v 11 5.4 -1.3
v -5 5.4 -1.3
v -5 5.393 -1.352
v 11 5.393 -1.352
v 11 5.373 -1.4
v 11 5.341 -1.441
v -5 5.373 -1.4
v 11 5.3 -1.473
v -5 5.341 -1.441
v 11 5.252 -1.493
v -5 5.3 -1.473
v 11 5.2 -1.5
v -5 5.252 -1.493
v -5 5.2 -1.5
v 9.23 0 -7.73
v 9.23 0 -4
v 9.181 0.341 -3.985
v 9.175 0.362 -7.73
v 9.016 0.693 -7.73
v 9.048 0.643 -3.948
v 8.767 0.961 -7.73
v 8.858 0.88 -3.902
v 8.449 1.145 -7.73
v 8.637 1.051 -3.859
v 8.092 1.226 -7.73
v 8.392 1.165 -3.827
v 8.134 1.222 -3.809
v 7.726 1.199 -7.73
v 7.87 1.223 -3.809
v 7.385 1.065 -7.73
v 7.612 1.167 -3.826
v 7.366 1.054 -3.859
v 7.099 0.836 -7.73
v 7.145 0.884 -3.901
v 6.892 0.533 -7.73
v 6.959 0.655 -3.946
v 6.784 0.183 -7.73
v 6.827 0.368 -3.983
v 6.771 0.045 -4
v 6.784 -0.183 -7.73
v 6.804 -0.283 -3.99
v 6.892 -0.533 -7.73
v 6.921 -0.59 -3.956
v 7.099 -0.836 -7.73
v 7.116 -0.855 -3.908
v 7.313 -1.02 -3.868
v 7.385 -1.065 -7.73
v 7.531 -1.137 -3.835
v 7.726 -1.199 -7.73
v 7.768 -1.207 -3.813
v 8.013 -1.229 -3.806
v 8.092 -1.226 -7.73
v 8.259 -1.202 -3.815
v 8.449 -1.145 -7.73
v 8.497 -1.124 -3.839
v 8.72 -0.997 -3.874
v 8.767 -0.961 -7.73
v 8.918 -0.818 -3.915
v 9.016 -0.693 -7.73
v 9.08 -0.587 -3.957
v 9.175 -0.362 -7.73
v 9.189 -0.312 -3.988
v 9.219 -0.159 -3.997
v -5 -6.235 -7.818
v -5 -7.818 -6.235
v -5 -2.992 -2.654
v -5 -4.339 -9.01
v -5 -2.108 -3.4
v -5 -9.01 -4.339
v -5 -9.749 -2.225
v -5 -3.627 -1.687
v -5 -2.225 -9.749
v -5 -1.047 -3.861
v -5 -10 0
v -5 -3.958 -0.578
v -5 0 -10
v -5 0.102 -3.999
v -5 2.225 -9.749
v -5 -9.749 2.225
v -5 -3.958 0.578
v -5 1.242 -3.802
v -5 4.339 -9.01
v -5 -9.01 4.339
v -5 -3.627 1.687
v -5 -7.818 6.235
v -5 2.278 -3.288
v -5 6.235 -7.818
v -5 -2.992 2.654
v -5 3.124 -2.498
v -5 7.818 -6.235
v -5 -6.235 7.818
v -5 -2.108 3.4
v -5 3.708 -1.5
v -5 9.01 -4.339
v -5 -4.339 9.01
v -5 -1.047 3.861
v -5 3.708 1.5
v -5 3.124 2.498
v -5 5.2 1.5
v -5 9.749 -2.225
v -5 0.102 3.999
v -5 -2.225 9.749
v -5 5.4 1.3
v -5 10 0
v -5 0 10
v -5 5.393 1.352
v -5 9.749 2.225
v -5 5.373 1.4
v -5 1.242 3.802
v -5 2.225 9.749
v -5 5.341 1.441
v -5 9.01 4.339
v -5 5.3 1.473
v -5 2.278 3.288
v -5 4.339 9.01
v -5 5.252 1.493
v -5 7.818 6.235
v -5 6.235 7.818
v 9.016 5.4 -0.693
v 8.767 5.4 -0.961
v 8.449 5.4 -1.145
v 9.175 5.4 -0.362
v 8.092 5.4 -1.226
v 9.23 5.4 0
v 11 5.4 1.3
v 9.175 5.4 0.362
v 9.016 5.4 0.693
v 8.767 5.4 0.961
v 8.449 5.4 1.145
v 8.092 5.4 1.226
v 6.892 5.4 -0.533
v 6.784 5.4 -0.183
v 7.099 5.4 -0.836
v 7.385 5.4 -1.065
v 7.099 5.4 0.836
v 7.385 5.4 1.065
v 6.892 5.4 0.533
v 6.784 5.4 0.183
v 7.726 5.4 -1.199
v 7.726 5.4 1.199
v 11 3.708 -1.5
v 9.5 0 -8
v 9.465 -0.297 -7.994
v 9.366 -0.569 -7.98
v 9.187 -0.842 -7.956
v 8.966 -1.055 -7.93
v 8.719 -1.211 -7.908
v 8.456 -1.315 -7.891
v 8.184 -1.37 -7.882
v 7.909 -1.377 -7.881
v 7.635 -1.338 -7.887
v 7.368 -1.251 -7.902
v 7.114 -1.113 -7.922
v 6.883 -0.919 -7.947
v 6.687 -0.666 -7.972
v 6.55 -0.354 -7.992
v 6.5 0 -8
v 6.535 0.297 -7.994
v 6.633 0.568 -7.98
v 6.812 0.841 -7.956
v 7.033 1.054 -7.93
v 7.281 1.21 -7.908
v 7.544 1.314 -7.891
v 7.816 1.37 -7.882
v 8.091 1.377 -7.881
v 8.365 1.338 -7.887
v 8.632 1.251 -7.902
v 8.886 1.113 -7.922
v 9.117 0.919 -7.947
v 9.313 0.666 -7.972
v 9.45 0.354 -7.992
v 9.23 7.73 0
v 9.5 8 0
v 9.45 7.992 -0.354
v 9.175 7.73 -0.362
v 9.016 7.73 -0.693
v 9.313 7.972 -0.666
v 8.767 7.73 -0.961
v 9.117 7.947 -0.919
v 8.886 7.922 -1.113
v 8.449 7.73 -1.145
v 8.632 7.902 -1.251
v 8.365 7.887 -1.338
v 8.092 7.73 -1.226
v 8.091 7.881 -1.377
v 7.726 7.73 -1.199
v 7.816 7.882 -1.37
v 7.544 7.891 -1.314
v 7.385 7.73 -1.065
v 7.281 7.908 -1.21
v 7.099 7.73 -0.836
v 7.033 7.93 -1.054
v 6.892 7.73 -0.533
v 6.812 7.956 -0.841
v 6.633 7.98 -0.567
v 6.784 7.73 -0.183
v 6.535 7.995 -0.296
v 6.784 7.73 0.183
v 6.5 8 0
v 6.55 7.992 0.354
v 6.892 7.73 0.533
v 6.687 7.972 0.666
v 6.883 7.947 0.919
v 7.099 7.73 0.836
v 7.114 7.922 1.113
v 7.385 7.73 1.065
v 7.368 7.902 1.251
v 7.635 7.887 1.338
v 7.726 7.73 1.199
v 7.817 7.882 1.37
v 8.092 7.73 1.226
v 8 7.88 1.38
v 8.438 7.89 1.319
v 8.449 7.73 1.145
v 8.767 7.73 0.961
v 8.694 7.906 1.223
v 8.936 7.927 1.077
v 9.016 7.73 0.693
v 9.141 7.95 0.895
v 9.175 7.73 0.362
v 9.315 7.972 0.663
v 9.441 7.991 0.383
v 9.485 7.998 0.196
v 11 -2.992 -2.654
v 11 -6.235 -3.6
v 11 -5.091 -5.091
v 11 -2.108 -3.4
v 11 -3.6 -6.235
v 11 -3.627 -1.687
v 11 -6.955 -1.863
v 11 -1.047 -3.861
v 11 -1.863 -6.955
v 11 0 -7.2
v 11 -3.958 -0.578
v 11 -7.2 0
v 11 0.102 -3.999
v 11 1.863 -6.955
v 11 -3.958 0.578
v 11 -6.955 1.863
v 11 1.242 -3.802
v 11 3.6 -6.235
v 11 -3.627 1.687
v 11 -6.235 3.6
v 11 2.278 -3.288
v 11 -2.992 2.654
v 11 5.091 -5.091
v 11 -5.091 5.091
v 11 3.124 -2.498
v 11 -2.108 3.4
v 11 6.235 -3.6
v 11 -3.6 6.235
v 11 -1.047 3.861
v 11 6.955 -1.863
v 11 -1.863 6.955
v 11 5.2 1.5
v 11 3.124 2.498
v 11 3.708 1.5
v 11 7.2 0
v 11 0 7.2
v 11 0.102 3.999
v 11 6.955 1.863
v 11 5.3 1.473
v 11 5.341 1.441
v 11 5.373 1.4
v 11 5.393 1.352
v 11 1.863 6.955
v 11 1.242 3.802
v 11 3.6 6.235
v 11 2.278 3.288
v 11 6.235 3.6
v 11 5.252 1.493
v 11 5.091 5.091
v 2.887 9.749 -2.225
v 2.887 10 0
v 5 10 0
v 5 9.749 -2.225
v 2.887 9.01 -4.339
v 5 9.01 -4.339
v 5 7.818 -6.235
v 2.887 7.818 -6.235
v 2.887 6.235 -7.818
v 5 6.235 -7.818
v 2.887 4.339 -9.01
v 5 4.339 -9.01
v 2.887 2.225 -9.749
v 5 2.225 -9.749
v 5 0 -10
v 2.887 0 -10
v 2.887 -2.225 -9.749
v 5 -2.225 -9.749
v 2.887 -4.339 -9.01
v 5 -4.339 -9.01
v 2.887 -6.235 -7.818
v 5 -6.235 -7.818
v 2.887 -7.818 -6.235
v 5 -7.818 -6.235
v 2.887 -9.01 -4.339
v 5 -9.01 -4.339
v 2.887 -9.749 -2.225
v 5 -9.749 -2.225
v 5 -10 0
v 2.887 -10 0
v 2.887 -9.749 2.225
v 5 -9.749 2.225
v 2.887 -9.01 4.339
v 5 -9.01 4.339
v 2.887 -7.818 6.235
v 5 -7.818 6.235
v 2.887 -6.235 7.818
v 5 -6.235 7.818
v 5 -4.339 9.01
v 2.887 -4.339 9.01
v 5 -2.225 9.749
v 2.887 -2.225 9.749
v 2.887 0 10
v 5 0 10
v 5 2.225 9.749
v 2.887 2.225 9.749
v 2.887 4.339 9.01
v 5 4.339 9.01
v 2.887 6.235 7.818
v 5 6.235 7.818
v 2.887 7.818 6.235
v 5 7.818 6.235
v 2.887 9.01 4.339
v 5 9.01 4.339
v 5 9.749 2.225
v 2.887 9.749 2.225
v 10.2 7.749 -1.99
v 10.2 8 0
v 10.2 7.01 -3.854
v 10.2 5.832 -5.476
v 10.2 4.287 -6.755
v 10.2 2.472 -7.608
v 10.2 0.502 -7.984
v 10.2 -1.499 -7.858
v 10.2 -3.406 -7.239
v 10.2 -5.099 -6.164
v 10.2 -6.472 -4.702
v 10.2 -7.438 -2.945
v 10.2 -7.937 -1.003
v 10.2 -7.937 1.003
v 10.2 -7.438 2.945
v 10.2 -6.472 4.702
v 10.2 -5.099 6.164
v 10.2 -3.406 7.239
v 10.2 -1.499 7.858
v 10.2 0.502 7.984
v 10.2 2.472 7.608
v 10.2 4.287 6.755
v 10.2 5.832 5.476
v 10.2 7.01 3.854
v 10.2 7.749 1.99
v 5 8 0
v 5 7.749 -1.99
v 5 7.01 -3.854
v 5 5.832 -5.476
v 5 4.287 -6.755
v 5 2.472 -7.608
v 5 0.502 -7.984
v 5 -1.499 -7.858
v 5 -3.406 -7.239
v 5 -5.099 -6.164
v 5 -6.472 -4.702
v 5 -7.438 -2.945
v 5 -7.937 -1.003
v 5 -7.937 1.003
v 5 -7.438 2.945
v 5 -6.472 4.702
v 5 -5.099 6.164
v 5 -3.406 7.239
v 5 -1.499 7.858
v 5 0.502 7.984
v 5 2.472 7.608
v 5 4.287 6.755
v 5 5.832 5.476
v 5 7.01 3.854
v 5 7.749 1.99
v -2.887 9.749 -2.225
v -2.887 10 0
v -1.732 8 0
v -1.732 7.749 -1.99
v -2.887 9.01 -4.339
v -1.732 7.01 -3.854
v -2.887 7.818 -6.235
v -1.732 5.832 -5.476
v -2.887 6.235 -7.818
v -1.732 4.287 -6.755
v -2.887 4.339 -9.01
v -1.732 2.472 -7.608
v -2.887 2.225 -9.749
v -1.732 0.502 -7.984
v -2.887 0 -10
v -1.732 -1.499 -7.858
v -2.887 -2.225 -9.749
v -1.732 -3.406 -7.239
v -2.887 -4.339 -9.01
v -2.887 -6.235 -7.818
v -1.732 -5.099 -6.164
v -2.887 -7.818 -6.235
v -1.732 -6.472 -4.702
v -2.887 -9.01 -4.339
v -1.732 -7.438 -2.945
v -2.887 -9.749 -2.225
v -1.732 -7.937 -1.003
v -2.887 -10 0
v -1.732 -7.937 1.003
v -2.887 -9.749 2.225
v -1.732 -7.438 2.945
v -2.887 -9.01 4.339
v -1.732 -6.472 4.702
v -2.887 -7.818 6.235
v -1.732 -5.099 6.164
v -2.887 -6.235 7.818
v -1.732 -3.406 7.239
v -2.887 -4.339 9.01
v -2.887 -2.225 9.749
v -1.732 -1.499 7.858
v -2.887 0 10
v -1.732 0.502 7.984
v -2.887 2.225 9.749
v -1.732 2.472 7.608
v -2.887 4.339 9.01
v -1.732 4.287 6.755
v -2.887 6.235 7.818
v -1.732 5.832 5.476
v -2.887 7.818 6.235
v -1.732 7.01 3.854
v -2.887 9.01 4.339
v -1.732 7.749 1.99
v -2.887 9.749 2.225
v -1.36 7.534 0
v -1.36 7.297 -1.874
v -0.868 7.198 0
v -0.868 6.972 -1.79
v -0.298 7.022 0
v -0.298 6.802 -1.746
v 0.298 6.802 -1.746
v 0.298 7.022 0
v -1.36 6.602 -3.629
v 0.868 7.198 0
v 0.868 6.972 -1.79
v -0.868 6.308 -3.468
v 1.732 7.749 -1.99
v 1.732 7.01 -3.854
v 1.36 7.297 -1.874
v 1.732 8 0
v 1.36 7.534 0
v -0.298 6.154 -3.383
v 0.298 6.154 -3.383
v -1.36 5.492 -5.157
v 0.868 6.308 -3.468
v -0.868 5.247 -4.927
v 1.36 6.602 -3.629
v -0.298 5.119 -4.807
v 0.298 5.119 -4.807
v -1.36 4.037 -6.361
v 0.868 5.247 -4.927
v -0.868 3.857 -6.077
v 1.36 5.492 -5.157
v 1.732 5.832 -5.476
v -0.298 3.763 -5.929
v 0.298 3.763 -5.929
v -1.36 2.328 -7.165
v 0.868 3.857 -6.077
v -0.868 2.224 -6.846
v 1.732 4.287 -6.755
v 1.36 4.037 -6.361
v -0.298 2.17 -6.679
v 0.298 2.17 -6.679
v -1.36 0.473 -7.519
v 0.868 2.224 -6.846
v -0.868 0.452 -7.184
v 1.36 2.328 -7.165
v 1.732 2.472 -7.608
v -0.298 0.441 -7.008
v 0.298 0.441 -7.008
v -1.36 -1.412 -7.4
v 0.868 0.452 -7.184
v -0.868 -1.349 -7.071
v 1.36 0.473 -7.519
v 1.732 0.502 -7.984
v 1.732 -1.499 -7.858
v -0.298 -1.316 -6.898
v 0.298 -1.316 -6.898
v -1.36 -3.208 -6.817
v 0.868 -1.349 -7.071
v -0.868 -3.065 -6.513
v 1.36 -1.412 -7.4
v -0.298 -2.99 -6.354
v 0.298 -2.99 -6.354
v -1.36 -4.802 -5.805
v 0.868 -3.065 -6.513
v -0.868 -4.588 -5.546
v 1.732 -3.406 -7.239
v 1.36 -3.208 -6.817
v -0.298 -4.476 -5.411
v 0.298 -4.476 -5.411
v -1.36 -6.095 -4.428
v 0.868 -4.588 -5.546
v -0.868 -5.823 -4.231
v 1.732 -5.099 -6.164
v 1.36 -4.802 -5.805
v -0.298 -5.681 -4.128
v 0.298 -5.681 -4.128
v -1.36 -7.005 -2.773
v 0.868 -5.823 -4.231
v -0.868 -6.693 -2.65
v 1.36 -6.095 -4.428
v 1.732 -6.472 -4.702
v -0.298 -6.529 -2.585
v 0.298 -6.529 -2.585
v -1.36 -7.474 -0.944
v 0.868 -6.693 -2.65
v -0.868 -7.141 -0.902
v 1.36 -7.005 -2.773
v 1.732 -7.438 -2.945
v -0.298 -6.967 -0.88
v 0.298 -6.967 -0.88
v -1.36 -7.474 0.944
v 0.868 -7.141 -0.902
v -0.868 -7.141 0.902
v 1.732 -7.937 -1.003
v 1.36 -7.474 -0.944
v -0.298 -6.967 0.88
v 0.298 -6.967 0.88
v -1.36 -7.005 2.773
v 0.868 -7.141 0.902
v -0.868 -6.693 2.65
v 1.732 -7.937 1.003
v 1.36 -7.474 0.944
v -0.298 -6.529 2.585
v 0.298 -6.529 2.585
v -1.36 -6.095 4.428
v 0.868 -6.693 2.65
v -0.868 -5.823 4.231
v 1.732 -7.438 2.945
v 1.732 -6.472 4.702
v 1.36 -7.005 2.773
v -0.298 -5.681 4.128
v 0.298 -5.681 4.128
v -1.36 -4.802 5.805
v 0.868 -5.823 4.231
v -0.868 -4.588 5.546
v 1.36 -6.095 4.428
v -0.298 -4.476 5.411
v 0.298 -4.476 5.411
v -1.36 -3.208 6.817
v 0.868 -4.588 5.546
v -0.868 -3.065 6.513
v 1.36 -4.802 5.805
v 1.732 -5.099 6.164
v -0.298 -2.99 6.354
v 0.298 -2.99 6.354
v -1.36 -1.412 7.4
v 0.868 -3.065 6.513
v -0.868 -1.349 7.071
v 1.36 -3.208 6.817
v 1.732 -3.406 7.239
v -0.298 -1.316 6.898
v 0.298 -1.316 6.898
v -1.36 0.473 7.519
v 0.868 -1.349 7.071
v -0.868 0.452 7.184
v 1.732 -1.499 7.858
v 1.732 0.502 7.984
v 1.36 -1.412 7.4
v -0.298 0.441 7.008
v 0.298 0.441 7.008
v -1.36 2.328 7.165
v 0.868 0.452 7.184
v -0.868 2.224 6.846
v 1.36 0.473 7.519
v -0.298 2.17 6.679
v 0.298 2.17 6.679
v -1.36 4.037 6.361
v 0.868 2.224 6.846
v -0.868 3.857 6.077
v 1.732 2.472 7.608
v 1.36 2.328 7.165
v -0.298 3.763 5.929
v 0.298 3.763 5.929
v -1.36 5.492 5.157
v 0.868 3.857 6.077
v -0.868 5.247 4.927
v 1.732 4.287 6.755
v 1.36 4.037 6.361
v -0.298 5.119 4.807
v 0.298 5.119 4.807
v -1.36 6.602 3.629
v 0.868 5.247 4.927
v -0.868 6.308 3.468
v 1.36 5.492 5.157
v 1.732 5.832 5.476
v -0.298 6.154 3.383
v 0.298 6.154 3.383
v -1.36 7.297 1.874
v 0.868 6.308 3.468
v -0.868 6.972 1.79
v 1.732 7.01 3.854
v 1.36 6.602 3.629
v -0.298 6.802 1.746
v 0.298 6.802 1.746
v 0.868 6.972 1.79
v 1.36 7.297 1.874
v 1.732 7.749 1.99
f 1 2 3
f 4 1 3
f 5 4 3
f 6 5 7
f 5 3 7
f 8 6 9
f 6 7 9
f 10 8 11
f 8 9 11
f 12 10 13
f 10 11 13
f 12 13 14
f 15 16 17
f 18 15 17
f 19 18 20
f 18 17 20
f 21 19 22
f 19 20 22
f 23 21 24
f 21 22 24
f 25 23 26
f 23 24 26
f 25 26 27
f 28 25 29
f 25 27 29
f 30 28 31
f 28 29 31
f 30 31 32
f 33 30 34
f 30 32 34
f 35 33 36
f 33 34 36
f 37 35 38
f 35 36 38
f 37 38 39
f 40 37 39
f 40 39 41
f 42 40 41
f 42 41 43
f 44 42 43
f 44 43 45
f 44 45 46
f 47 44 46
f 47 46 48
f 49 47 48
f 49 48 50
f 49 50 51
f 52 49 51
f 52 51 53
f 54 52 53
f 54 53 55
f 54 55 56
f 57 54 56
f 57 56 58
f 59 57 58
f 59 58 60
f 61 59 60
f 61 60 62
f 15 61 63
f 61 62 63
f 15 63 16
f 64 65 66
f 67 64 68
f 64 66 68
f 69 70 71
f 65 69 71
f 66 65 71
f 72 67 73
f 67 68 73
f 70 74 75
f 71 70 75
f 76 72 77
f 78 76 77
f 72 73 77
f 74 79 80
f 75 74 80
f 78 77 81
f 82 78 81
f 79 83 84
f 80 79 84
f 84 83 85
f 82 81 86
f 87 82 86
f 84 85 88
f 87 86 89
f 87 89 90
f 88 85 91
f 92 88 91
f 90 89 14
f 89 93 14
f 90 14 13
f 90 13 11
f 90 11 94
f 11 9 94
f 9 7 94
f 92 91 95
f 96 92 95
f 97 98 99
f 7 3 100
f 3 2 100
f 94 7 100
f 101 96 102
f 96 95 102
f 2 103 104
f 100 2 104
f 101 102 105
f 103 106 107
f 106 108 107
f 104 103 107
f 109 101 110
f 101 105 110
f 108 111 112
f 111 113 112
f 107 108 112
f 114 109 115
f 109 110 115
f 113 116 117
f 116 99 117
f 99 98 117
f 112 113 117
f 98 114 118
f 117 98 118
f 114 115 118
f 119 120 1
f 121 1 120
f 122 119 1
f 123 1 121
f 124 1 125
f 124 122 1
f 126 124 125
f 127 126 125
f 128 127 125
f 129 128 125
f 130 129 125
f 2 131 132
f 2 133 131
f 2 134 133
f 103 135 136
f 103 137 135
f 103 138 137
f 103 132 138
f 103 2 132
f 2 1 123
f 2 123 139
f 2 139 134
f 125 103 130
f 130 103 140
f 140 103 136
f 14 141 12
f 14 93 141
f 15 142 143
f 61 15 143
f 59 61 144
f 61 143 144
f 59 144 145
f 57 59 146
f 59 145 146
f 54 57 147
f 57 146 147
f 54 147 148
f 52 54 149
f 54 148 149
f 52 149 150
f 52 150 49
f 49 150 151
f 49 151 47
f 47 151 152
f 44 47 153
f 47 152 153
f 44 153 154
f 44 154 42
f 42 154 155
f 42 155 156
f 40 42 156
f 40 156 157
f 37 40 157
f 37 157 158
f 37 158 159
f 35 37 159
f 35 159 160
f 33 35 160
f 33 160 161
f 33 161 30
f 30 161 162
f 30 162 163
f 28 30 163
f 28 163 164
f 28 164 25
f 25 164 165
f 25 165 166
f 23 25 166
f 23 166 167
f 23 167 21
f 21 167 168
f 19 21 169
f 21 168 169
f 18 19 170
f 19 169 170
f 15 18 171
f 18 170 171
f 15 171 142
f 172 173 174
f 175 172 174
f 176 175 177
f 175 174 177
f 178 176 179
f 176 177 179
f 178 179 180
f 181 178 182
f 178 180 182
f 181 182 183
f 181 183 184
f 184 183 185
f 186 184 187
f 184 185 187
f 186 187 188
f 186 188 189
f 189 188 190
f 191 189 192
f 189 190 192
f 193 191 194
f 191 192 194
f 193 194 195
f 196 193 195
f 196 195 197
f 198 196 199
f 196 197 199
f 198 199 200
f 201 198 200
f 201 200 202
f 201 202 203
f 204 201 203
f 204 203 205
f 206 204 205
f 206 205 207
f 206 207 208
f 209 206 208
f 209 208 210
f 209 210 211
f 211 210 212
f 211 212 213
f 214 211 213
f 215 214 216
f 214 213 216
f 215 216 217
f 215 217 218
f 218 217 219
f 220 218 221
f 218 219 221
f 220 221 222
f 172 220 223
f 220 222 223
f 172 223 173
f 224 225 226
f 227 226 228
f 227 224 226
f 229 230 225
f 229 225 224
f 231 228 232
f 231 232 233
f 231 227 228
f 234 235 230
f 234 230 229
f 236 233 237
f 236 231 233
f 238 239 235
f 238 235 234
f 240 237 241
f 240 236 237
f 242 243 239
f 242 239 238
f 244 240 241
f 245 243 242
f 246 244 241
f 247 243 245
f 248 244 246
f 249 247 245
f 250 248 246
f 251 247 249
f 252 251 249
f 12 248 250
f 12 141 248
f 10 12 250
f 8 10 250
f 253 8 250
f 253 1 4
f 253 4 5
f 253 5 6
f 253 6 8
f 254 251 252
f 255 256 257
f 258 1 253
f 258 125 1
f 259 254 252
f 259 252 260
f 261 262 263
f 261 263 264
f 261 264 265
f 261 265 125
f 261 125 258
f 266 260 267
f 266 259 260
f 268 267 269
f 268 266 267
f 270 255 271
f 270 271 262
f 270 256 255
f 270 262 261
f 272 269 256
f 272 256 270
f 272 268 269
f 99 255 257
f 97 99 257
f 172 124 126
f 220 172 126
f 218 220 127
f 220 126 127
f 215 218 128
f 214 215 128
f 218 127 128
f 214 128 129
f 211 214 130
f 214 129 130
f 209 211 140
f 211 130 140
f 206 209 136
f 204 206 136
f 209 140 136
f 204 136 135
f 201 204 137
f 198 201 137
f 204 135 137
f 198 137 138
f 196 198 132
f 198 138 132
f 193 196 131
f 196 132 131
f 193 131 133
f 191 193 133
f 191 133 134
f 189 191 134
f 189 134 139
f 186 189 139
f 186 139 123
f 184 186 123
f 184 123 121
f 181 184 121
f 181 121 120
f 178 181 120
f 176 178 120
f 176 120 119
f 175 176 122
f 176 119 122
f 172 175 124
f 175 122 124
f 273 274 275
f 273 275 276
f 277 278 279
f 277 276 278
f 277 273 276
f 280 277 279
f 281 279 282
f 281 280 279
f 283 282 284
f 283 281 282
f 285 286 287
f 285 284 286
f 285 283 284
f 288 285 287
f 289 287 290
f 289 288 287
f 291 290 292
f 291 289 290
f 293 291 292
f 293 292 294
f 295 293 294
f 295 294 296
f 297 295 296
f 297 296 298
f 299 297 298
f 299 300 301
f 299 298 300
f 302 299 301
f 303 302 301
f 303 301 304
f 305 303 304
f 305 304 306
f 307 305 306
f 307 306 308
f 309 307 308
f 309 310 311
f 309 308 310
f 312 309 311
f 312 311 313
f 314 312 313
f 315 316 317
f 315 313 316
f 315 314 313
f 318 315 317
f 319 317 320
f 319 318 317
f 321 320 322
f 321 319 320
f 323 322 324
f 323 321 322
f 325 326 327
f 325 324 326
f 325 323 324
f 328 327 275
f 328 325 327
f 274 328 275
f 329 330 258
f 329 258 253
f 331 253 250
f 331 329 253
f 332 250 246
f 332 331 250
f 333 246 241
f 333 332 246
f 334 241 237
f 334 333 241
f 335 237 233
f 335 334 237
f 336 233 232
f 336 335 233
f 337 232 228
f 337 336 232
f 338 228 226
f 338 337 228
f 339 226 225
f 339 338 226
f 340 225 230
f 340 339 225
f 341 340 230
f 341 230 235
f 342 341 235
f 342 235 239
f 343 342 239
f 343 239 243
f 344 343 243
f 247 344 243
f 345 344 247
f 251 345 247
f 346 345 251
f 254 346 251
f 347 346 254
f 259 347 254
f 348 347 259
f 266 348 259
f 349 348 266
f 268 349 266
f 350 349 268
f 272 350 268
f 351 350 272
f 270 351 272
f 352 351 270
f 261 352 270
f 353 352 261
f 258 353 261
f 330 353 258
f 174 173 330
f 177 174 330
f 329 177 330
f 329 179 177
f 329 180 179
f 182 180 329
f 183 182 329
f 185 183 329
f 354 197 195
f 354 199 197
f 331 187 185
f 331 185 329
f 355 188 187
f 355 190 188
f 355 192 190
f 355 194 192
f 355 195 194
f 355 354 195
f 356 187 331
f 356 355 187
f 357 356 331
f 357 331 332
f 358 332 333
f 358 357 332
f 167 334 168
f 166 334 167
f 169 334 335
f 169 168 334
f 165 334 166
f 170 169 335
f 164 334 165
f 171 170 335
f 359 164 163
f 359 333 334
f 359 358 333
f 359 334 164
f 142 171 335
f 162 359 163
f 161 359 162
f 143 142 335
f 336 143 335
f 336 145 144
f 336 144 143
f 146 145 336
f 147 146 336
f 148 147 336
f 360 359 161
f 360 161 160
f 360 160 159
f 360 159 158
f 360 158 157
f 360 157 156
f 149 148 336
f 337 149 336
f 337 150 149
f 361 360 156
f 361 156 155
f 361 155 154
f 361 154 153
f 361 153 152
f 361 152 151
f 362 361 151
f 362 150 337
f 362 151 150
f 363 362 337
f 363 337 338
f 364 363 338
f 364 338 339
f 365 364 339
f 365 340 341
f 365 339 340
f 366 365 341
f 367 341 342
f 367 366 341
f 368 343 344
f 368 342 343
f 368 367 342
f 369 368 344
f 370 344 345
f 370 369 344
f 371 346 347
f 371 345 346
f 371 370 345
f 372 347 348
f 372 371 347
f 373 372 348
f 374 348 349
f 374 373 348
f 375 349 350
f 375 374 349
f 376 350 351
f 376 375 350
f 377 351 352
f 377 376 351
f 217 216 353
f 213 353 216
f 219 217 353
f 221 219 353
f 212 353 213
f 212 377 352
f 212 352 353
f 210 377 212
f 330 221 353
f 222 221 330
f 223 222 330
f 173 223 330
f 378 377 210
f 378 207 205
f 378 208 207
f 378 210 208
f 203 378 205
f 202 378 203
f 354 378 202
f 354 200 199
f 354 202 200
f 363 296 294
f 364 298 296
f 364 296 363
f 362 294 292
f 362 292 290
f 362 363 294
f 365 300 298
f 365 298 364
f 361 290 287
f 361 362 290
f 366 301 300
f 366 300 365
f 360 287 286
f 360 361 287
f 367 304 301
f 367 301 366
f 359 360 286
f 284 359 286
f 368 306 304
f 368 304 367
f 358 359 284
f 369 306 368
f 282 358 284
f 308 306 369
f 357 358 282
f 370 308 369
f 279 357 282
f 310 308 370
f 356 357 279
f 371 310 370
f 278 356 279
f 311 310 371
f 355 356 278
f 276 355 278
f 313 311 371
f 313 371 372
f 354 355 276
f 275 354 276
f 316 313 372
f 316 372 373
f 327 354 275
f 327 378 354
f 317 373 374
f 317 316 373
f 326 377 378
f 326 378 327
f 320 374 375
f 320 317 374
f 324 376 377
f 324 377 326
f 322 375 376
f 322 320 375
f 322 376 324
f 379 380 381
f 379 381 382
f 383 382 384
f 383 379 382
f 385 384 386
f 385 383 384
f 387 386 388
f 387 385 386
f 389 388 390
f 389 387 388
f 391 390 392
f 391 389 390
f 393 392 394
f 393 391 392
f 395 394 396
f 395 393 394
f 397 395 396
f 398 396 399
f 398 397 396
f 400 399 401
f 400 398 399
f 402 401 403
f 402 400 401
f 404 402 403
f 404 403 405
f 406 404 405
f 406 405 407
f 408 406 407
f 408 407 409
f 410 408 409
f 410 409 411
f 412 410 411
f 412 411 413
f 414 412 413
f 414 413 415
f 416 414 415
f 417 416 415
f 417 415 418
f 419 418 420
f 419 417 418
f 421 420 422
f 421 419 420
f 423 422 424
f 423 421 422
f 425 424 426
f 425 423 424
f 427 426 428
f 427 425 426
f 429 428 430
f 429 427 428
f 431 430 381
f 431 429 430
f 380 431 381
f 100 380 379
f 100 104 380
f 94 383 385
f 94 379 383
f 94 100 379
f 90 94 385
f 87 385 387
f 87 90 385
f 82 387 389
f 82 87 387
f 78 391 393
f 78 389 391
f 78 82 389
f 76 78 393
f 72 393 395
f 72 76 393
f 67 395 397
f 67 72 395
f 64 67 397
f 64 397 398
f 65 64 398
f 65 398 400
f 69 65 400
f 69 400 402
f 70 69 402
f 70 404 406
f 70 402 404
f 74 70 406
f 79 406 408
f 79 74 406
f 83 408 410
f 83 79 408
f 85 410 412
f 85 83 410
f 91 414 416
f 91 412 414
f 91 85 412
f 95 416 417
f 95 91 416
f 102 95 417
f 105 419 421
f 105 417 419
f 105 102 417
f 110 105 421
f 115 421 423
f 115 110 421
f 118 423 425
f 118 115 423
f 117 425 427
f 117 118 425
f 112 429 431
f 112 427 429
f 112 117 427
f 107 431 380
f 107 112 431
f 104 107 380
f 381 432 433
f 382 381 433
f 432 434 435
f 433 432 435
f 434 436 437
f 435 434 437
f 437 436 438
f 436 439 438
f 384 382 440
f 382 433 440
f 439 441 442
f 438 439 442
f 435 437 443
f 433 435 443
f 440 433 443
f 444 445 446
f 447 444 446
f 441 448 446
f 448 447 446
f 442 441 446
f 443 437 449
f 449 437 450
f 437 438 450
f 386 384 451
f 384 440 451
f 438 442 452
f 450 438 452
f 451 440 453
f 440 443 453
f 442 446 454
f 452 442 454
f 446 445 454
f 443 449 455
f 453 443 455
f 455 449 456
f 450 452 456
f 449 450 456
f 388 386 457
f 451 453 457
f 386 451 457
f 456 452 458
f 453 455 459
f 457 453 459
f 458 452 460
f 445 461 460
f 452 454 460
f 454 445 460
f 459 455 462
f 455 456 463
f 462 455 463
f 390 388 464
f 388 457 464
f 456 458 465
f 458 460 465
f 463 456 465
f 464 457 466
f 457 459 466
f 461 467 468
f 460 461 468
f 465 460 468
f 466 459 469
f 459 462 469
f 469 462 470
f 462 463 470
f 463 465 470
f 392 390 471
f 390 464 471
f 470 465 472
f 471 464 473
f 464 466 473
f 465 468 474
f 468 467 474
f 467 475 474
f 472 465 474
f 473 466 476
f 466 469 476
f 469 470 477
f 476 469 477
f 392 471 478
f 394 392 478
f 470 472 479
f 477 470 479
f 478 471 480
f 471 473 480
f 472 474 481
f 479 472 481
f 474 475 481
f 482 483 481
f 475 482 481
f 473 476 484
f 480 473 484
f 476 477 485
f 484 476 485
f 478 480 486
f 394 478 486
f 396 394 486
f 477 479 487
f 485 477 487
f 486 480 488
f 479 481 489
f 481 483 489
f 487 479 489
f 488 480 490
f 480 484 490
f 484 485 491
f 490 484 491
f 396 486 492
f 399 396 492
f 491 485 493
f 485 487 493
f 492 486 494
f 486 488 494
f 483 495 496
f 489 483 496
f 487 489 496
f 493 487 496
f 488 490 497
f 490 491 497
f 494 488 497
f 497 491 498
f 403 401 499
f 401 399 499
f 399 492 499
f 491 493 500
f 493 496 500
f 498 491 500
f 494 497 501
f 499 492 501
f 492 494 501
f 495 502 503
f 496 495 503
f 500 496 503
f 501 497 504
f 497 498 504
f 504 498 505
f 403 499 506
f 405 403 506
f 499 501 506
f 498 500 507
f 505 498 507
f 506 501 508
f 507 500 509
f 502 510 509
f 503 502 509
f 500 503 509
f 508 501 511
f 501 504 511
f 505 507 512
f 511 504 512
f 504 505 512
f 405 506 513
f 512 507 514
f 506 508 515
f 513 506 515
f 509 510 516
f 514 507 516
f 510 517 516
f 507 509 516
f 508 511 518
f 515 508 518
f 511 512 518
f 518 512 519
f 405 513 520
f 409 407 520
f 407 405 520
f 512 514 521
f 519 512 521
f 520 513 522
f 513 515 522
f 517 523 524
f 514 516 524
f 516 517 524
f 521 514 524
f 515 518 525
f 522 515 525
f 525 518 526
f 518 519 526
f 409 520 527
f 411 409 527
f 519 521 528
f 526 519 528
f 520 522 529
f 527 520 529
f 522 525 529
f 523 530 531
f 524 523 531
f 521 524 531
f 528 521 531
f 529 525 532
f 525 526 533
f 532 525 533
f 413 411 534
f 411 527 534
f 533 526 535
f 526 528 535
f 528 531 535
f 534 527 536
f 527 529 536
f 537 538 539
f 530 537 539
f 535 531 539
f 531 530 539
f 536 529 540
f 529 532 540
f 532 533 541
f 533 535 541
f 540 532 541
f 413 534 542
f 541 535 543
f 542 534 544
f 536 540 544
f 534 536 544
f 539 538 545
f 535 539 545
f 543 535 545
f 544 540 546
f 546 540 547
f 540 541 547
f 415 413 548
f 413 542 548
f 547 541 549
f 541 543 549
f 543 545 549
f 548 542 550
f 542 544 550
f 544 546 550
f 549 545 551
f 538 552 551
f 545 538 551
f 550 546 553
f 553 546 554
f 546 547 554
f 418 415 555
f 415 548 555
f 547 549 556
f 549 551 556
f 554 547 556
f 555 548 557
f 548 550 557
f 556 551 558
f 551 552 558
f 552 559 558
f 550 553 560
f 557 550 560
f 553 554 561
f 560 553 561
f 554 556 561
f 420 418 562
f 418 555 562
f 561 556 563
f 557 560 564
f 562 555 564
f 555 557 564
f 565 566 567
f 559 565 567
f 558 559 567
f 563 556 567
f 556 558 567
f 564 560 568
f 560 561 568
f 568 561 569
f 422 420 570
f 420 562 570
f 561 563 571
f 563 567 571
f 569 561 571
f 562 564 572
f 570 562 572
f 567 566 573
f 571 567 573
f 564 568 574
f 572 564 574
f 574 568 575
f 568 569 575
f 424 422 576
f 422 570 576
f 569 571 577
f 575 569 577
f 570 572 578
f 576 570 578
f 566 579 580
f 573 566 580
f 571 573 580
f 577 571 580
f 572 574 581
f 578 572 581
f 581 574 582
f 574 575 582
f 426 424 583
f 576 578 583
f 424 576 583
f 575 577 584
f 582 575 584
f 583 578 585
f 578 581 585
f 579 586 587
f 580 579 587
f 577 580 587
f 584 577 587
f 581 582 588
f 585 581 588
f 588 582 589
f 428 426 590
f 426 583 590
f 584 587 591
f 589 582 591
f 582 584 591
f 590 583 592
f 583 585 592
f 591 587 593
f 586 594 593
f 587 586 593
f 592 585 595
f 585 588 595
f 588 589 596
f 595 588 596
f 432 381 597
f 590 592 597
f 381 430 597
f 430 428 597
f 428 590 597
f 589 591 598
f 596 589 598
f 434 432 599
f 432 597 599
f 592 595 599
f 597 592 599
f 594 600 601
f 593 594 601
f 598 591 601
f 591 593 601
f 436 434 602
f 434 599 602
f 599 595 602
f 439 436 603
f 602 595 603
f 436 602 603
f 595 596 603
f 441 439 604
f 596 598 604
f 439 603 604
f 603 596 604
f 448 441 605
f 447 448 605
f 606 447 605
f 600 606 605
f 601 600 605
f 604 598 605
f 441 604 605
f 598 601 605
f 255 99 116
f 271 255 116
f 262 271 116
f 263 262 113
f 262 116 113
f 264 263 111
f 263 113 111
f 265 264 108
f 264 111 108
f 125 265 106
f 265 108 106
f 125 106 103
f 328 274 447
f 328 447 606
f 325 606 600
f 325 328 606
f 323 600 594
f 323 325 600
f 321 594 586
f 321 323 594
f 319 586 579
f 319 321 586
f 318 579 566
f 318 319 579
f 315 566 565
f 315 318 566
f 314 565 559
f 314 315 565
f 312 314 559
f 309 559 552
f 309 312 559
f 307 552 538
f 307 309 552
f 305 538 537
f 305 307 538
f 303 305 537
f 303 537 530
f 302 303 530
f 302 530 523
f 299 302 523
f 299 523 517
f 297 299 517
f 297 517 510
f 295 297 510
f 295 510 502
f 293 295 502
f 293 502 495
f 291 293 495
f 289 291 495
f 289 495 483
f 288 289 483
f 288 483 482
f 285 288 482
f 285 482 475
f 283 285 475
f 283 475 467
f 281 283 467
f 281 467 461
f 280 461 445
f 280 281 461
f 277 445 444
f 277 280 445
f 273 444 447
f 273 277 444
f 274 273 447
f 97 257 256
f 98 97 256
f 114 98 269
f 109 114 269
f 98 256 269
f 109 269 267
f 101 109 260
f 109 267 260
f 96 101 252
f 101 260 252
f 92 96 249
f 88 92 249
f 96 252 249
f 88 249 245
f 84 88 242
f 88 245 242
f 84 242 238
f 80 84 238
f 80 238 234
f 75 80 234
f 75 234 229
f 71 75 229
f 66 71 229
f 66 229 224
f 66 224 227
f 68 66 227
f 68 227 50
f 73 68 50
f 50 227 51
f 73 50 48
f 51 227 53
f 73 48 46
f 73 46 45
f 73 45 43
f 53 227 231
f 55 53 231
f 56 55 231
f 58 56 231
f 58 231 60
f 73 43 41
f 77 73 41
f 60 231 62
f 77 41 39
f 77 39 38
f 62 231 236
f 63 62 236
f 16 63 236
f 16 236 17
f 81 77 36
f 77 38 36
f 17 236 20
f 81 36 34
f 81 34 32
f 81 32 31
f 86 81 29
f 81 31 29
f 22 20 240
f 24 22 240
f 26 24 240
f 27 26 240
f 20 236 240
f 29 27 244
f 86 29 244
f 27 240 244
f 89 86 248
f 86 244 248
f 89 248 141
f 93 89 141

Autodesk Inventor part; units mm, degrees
ref_plane "YZ Plane" through (0, 0, 0) normal (1, 0, 0) x (0, 1, 0)
ref_plane "XZ Plane" through (0, 0, 0) normal (0, 1, 0) x (-1, 0, 0)
ref_plane "XY Plane" through (0, 0, 0) normal (0, 0, 1) x (1, 0, 0)
sketch "Sketch_2" plane through (0, 0, 0) normal (0, 0, 1) x (1, 0, 0)
  line L0 (11, 0) -> (-5, 0)
  line L1 (-5, 10) -> (-5, 4)
  line L2 (-5, 4) -> (11, 4)
  line L3 (11, 4) -> (11, 7.2)
  line L4 (11, 7.2) -> (10.2, 8)
  line L5 (10.2, 8) -> (5, 8)
  line L6 (5, 8) -> (5, 10)
  line L7 (5, 10) -> (2.8868, 10)
  line L8 (2.8868, 10) -> (1.7321, 8)
  arc A0 (-1.7321, 8) -> (1.7321, 8) centre (0, 9) ccw
  line L9 (-1.7321, 8) -> (-2.8868, 10)
  line L10 (-2.8868, 10) -> (-5, 10)
revolve "Revolution1" add sketch "Sketch_2" angle 360 about axis through (11, 0, 0) along (1, 0, 0)
sketch "Sketch_4" plane through (-5, 0, 0) normal (1, 0, 0) x (0, 0, -1)
  line L0 (-1.5, 2.6) -> (1.5, 2.6)
  line L1 (1.5, 2.6) -> (1.5, 5.2)
  arc A0 (1.5, 5.2) -> (1.3, 5.4) centre (1.3, 5.2) ccw
  line L2 (1.3, 5.4) -> (-1.3, 5.4)
  arc A1 (-1.3, 5.4) -> (-1.5, 5.2) centre (-1.3, 5.2) ccw
  line L3 (-1.5, 5.2) -> (-1.5, 2.6)
extrude "Extrusion1" cut sketch "Sketch_4" along normal blind 30
sketch "Sketch_5" plane through (0, 0, 0) normal (0, 0, 1) x (1, 0, 0)
  line L0 (8, 5.4) -> (8, 8)
  line L1 (8, 8) -> (9.5, 8)
  line L2 (9.5, 8) -> (9.2295, 7.7295)
  line L3 (9.2295, 7.7295) -> (9.2295, 5.4)
  line L4 (9.2295, 5.4) -> (8, 5.4)
  line L5 (8, 5.4) -> (8, 8)
revolve "Revolution2" cut sketch "Sketch_5" angle 360 about axis through (8, 5.4, 0) along (0, -1, 0)
thread "Thread1" size "M3x0.5" class "6H" standard "ISO Metric profile" full length
sketch "Sketch_8" plane through (0, 0, 0) normal (0, 1, 0) x (-1, 0, 0)
  line L0 (-8, -3) -> (-8, -8)
  line L1 (-8, -8) -> (-9.5, -8)
  line L2 (-9.5, -8) -> (-9.2295, -7.7295)
  line L3 (-9.2295, -7.7295) -> (-9.2295, -3)
  line L4 (-9.2295, -3) -> (-8, -3)
  line L5 (-8, -3) -> (-8, -8)
revolve "Revolution3" cut sketch "Sketch_8" angle 360 about axis through (8, 0, -3) along (0, 0, 1)
thread "Thread2" size "M3x0.5" class "6H" standard "ISO Metric profile" full length
properties part number "MBR18-2-N8"
